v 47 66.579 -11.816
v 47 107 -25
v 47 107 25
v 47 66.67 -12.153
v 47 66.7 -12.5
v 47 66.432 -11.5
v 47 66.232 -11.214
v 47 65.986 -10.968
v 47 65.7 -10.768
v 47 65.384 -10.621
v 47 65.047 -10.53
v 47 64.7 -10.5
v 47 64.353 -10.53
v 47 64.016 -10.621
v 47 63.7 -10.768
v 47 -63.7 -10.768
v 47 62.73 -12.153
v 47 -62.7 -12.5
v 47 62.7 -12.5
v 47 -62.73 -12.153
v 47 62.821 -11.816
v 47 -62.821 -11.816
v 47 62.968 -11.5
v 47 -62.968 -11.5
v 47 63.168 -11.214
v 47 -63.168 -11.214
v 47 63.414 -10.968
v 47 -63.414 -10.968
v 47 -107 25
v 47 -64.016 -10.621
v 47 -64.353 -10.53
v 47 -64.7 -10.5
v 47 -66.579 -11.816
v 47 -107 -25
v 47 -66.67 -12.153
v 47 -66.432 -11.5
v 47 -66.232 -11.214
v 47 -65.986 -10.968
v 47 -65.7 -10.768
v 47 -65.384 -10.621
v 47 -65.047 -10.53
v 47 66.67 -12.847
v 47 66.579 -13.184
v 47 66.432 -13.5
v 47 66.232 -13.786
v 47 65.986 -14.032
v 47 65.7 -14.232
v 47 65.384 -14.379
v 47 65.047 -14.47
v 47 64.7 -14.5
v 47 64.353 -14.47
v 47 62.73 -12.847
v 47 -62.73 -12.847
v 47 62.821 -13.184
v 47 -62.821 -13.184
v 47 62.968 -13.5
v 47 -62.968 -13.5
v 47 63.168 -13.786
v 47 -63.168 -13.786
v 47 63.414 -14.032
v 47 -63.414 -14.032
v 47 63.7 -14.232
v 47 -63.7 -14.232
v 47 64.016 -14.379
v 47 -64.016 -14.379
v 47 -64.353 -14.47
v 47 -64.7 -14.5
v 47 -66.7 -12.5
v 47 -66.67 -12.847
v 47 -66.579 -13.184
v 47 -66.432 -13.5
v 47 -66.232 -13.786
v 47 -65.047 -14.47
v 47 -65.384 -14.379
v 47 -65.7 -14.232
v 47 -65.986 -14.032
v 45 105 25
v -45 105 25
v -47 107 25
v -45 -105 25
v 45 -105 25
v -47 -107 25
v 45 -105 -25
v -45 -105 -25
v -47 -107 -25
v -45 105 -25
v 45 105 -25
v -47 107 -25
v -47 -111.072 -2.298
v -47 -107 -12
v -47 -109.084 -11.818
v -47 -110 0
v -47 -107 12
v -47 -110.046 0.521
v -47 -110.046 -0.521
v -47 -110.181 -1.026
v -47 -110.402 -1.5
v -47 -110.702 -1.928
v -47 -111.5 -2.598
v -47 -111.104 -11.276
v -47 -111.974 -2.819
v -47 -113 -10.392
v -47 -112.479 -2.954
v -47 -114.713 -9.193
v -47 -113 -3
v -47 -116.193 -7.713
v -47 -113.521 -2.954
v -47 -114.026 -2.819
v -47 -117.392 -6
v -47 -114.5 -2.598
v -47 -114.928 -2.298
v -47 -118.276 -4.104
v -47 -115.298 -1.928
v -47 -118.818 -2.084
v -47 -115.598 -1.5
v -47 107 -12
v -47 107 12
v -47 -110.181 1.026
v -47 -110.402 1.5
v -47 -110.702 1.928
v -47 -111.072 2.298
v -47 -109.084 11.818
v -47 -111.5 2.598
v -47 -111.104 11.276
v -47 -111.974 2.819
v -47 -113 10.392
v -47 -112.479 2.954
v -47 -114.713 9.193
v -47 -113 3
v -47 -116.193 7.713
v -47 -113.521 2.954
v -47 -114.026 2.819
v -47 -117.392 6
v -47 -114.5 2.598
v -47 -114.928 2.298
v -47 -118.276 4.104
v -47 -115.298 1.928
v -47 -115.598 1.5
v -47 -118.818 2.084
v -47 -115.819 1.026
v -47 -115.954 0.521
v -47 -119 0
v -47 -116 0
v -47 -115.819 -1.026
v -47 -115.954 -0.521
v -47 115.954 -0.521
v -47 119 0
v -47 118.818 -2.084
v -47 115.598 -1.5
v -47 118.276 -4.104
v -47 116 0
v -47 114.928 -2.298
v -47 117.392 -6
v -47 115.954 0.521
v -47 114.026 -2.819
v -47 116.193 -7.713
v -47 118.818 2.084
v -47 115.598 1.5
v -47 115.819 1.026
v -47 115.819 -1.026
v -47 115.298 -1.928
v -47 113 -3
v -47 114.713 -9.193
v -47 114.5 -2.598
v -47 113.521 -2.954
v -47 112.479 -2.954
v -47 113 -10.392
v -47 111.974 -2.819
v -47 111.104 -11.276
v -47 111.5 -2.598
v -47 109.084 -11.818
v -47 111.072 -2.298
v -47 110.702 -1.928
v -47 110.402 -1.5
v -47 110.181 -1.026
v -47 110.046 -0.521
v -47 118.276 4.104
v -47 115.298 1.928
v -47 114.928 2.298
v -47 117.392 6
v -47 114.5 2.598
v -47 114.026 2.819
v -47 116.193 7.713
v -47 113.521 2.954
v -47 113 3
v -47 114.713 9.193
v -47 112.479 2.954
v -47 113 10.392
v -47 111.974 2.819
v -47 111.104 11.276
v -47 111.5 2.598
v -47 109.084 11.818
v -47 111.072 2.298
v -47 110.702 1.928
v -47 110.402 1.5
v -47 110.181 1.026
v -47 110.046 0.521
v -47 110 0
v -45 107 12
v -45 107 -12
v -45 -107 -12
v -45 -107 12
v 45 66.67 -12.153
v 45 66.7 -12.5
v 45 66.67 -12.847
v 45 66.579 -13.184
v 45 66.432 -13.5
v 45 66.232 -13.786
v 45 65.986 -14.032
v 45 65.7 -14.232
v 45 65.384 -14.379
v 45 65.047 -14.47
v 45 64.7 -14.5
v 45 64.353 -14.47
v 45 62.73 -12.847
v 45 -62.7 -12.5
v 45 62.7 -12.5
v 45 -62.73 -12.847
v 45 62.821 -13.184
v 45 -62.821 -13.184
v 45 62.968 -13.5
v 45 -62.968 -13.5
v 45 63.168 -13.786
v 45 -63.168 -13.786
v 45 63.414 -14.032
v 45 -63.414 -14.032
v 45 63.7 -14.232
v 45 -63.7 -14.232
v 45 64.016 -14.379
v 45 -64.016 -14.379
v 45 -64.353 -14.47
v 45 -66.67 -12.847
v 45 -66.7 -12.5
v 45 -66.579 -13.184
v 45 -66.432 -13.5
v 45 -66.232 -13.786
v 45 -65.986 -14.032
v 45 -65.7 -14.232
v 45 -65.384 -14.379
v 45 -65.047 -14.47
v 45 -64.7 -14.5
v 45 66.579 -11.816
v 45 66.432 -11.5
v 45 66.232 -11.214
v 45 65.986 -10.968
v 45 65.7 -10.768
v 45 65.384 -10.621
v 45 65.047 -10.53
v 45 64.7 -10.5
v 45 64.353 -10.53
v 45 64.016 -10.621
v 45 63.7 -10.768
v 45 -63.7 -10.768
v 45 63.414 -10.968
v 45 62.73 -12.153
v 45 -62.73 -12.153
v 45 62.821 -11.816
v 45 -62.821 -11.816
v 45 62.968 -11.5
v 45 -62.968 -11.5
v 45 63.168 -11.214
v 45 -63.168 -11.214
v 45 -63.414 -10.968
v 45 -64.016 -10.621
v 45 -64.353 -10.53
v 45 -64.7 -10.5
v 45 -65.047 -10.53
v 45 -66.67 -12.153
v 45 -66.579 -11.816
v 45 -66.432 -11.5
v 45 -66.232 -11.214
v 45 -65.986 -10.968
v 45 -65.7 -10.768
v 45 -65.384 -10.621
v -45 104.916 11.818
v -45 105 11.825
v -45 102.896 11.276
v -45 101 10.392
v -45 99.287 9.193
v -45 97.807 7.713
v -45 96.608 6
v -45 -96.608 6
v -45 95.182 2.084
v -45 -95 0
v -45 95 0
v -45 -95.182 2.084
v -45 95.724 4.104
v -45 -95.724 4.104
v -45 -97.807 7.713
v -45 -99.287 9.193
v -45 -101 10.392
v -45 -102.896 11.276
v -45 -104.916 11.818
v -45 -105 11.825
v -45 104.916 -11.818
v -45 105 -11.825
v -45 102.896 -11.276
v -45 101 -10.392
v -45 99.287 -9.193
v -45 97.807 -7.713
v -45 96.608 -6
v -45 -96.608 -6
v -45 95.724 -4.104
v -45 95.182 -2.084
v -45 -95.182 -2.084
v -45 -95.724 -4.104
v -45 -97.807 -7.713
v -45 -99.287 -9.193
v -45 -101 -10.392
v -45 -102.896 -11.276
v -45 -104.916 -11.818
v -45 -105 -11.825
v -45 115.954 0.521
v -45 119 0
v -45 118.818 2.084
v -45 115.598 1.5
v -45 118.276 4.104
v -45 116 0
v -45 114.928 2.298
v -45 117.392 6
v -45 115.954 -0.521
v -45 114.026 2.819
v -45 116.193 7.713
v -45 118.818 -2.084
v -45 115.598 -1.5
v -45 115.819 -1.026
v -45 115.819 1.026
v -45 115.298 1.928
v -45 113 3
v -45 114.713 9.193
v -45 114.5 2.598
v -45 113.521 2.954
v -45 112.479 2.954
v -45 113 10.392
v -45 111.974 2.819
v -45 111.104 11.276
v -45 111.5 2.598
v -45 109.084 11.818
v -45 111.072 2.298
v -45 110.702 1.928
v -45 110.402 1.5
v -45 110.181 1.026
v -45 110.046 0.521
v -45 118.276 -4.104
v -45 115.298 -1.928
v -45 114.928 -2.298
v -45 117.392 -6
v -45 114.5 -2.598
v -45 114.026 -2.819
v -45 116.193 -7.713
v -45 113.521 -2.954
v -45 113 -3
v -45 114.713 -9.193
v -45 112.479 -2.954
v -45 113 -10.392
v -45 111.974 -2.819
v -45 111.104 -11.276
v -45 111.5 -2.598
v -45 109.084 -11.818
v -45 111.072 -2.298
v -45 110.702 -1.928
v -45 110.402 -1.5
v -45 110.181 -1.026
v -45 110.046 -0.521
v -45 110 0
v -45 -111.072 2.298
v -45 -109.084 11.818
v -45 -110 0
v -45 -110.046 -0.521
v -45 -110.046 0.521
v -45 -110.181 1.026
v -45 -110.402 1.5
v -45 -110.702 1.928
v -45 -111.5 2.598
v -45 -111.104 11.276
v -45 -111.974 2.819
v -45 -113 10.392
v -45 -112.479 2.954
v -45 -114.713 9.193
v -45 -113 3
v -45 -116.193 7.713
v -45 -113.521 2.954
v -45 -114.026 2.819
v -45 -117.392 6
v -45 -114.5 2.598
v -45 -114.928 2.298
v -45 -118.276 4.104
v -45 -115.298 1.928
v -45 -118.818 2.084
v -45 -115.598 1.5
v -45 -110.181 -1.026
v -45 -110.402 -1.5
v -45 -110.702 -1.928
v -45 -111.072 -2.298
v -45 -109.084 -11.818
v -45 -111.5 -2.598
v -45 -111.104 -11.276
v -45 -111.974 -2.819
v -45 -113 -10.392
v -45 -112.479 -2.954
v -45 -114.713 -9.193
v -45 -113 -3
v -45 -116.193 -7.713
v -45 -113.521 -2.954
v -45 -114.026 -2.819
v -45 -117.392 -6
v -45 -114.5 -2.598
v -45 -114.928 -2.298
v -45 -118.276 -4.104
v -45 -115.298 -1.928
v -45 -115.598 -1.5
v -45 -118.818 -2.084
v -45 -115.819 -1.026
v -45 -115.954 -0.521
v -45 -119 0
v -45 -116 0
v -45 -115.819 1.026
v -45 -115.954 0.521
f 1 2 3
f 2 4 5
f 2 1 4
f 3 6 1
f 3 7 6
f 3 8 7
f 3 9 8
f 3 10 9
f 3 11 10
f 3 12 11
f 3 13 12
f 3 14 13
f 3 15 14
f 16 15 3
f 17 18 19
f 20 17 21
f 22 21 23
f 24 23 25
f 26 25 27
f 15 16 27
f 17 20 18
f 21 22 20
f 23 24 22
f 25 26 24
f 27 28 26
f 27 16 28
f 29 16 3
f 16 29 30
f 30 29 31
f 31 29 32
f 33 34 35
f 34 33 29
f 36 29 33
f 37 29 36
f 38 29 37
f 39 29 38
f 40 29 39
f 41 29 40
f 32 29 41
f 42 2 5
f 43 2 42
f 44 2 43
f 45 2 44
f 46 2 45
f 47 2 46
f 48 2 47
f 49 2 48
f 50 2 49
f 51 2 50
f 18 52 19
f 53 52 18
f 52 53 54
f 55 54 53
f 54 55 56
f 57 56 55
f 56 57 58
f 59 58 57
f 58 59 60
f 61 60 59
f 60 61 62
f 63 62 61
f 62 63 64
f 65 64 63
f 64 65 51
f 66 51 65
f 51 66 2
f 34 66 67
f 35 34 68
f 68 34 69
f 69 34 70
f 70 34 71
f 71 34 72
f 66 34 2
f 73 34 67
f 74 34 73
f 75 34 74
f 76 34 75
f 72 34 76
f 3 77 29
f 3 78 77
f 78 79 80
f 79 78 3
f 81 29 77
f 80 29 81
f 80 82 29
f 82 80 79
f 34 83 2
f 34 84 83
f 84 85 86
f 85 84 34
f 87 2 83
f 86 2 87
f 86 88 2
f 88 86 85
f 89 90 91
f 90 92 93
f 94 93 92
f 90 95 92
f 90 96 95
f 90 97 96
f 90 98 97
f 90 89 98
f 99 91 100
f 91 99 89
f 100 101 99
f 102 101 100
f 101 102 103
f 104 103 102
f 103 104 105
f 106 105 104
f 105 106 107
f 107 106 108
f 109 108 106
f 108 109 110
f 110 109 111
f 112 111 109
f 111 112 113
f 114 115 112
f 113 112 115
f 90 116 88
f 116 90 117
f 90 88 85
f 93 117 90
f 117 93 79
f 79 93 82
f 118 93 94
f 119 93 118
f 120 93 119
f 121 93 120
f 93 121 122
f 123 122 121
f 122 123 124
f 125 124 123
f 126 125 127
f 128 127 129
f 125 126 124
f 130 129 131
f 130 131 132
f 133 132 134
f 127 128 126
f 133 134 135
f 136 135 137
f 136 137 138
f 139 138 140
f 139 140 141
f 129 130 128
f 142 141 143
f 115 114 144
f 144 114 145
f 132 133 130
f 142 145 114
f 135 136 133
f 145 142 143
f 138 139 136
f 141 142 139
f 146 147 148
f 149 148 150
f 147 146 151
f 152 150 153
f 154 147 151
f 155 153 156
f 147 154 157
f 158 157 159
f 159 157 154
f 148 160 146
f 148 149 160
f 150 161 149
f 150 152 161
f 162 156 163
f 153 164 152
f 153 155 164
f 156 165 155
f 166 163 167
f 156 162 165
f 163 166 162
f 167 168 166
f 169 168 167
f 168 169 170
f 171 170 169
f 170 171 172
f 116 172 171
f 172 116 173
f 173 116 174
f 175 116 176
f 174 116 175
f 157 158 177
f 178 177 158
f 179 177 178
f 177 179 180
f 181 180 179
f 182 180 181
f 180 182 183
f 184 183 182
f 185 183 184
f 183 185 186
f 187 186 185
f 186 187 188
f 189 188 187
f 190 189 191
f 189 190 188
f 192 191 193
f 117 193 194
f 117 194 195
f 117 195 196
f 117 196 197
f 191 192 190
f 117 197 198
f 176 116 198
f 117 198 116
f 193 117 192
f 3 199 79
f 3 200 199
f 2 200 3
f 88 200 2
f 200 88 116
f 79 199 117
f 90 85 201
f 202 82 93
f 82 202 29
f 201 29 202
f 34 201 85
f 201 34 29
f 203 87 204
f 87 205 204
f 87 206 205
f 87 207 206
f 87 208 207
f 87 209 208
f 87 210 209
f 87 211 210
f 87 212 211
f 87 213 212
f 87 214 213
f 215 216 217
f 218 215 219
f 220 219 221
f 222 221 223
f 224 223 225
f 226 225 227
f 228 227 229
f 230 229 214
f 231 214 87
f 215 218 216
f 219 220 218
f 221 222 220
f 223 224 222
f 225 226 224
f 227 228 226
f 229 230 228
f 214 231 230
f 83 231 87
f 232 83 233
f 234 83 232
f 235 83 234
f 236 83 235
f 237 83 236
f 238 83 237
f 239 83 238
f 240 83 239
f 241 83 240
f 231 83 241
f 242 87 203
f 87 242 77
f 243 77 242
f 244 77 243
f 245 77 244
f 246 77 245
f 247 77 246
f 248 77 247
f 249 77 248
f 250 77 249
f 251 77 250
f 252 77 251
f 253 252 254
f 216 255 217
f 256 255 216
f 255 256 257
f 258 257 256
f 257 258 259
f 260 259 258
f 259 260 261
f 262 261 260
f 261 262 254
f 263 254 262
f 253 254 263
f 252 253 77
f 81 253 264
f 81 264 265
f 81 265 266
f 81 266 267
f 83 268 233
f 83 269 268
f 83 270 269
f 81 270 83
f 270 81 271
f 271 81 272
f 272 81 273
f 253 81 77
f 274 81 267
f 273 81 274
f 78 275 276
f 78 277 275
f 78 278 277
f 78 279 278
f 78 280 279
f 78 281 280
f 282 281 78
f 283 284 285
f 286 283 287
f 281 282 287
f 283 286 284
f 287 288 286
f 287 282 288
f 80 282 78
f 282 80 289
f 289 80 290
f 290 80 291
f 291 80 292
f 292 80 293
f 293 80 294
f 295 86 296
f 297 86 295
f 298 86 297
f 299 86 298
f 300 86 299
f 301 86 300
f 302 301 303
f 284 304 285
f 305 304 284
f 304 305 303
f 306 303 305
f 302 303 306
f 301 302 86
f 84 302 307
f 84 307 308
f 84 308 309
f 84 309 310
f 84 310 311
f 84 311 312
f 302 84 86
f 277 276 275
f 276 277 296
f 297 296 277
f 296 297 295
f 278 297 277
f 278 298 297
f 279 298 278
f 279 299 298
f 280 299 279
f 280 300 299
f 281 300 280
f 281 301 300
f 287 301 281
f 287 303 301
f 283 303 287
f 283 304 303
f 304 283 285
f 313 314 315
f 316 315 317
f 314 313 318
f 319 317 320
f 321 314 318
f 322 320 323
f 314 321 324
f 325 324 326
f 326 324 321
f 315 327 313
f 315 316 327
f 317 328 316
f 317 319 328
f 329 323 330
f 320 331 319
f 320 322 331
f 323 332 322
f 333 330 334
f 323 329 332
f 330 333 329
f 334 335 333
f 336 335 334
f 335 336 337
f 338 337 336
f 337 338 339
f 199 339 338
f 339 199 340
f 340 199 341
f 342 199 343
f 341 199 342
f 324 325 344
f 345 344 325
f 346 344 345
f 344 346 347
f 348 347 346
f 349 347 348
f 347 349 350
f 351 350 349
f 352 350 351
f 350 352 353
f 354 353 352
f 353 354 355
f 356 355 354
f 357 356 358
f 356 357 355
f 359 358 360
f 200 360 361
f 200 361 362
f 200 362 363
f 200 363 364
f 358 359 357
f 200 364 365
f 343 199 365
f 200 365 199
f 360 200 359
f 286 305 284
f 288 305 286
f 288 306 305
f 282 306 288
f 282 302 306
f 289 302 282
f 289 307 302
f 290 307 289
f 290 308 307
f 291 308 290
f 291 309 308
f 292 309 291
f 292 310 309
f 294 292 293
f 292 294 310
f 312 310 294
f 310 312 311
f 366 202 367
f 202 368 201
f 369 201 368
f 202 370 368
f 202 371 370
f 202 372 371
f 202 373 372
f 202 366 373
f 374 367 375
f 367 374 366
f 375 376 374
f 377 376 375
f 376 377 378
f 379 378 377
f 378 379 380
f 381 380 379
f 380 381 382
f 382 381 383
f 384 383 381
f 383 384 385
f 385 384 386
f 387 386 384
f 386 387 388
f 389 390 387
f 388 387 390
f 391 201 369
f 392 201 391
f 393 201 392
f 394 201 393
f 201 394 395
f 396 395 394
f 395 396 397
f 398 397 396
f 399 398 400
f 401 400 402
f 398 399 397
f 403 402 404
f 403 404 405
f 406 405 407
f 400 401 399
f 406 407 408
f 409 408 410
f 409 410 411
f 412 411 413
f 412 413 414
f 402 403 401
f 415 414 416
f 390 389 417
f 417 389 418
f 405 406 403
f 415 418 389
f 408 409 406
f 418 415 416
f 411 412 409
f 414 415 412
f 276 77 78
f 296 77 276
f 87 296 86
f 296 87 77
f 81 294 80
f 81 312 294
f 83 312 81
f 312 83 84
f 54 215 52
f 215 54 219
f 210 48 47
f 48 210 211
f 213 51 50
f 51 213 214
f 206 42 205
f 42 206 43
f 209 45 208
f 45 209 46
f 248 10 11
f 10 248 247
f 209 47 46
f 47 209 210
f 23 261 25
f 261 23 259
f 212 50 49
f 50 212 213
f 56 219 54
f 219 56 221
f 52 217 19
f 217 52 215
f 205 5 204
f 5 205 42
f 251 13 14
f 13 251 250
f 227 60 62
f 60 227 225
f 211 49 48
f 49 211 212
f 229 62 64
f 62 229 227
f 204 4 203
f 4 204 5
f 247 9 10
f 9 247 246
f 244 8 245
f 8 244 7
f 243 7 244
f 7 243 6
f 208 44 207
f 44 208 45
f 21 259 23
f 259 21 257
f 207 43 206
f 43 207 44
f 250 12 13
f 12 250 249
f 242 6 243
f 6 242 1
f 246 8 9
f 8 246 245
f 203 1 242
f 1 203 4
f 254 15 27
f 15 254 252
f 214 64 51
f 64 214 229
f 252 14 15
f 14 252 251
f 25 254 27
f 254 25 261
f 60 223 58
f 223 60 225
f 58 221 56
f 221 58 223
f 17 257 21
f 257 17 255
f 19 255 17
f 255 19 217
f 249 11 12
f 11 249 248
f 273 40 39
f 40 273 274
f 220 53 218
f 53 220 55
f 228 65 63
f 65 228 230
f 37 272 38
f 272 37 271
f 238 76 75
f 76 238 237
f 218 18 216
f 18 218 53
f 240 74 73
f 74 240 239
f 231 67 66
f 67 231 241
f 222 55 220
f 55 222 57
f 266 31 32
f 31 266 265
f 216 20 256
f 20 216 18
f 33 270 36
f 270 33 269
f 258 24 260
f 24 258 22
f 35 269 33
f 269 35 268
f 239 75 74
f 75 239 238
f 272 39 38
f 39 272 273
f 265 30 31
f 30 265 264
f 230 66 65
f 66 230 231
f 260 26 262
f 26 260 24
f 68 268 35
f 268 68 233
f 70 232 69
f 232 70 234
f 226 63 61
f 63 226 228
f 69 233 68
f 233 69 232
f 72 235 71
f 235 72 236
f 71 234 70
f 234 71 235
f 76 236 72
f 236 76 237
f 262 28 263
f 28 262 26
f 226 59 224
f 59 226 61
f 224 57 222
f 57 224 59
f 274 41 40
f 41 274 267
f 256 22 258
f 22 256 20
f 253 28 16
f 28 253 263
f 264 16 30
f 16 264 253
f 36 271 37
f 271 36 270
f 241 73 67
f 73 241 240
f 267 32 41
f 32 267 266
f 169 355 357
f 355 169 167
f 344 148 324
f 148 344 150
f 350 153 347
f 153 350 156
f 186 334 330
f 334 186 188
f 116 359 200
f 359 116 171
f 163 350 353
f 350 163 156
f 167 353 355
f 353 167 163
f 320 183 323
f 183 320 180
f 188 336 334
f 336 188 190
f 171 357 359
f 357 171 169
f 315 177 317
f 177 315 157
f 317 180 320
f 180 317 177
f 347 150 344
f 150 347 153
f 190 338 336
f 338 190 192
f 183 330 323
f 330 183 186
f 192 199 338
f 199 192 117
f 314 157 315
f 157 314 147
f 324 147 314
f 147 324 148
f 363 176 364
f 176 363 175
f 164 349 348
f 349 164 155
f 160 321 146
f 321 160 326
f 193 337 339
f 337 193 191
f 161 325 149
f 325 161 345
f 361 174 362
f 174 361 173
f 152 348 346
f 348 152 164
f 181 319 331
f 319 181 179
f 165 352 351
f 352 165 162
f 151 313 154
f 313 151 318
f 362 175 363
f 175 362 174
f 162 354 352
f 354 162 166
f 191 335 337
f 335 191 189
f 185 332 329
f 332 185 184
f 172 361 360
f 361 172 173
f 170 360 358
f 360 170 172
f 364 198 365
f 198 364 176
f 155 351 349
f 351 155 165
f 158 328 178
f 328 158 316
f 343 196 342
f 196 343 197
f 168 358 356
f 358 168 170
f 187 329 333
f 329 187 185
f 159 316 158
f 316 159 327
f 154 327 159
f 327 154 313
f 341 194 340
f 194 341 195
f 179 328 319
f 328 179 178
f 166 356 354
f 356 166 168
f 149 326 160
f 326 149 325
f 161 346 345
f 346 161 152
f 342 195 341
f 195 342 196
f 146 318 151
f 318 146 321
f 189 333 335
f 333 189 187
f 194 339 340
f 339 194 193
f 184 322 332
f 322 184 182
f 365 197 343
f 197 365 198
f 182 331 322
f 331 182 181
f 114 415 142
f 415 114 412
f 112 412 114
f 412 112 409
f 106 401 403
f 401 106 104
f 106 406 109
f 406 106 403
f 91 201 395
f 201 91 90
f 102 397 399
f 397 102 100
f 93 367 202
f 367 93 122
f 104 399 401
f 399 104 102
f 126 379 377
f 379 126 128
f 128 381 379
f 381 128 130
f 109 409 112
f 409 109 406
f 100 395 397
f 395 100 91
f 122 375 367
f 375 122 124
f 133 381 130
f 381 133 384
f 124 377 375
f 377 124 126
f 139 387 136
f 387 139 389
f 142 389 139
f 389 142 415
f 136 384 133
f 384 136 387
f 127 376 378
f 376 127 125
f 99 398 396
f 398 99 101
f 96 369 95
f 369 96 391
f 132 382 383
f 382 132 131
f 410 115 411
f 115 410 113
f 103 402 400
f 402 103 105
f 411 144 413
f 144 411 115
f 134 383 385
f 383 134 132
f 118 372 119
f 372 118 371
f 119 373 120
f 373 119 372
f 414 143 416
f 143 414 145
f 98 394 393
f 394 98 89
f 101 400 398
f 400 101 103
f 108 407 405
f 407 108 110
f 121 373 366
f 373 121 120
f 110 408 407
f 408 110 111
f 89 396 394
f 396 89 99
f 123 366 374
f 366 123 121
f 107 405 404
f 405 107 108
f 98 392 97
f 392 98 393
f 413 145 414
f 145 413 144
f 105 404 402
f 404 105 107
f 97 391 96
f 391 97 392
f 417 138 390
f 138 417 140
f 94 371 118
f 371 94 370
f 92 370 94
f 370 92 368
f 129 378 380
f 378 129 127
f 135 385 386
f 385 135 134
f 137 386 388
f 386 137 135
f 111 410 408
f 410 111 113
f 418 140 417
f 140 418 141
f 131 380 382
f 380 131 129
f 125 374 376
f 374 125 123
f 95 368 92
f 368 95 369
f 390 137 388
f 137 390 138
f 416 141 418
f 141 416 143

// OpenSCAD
// Diameter of the screw holes for the AP mounting bracket
screwwidth   = 4;
// Distance (center to center) between the screw holes for
// the AP mounting bracket
screwspacing = 129.4;

// thickness of the overall object
shell = 2;

// How much clearance to allow for the AP diameter
apdiameter = 210;
// How much clearance to allow for the AP thickness,
// including room to maneuver into the bracket
apdepth = 90;

// Width of the overall bracket
width = 50;

// Diameter of the screw holes to bolt this bracket to the ceiling
earhole = 6;
// How much margin to build around the bolt holes
earshell = 3;

// a bit extra to make holes clean
extra = 0.1;

$fn = 36;

difference () {
    
    // base shell
    cube([apdepth+(2*shell), apdiameter+(2*shell), width], center=true);
    cube([apdepth, apdiameter, width+(2*extra)], center=true);
    
    // screw holes for the AP bracket
    translate([(apdepth+shell)/2,screwspacing/2,-0.25*width]){
        rotate([0,90,0]){
            cylinder(h=shell+1, d=screwwidth, center=true);
        }
    }
    translate([(apdepth+shell)/2,-screwspacing/2,-0.25*width]){
        rotate([0,90,0]){
            cylinder(h=shell+1, d=screwwidth, center=true);
        }
    }
}


// ears to bolt bracket to ceiling
difference() {
    translate([-((apdepth+shell)/2), (apdiameter/2)+shell, 0]){
        rotate([0,90,0]){
            cylinder(r = (2*earshell)+earhole, h = shell, center=true);
        }
    }
    
    translate([-((apdepth+shell)/2), (apdiameter/2)+(earhole/2)+earshell+shell, 0]){
        rotate([0,90,0]){
            cylinder(d=earhole, h=shell+extra, center=true);
        }
    }
}

difference() {
    translate([-((apdepth+shell)/2), -((apdiameter/2)+shell), 0]){
        rotate([0,90,0]){
            cylinder(r = (2*earshell)+earhole, h = shell, center=true);
        }
    }
       translate([-((apdepth+shell)/2), -((apdiameter/2)+(earhole/2)+earshell+shell), 0]){
        rotate([0,90,0]){
            cylinder(d=earhole, h=shell+extra, center=true);
        }
    }
}
